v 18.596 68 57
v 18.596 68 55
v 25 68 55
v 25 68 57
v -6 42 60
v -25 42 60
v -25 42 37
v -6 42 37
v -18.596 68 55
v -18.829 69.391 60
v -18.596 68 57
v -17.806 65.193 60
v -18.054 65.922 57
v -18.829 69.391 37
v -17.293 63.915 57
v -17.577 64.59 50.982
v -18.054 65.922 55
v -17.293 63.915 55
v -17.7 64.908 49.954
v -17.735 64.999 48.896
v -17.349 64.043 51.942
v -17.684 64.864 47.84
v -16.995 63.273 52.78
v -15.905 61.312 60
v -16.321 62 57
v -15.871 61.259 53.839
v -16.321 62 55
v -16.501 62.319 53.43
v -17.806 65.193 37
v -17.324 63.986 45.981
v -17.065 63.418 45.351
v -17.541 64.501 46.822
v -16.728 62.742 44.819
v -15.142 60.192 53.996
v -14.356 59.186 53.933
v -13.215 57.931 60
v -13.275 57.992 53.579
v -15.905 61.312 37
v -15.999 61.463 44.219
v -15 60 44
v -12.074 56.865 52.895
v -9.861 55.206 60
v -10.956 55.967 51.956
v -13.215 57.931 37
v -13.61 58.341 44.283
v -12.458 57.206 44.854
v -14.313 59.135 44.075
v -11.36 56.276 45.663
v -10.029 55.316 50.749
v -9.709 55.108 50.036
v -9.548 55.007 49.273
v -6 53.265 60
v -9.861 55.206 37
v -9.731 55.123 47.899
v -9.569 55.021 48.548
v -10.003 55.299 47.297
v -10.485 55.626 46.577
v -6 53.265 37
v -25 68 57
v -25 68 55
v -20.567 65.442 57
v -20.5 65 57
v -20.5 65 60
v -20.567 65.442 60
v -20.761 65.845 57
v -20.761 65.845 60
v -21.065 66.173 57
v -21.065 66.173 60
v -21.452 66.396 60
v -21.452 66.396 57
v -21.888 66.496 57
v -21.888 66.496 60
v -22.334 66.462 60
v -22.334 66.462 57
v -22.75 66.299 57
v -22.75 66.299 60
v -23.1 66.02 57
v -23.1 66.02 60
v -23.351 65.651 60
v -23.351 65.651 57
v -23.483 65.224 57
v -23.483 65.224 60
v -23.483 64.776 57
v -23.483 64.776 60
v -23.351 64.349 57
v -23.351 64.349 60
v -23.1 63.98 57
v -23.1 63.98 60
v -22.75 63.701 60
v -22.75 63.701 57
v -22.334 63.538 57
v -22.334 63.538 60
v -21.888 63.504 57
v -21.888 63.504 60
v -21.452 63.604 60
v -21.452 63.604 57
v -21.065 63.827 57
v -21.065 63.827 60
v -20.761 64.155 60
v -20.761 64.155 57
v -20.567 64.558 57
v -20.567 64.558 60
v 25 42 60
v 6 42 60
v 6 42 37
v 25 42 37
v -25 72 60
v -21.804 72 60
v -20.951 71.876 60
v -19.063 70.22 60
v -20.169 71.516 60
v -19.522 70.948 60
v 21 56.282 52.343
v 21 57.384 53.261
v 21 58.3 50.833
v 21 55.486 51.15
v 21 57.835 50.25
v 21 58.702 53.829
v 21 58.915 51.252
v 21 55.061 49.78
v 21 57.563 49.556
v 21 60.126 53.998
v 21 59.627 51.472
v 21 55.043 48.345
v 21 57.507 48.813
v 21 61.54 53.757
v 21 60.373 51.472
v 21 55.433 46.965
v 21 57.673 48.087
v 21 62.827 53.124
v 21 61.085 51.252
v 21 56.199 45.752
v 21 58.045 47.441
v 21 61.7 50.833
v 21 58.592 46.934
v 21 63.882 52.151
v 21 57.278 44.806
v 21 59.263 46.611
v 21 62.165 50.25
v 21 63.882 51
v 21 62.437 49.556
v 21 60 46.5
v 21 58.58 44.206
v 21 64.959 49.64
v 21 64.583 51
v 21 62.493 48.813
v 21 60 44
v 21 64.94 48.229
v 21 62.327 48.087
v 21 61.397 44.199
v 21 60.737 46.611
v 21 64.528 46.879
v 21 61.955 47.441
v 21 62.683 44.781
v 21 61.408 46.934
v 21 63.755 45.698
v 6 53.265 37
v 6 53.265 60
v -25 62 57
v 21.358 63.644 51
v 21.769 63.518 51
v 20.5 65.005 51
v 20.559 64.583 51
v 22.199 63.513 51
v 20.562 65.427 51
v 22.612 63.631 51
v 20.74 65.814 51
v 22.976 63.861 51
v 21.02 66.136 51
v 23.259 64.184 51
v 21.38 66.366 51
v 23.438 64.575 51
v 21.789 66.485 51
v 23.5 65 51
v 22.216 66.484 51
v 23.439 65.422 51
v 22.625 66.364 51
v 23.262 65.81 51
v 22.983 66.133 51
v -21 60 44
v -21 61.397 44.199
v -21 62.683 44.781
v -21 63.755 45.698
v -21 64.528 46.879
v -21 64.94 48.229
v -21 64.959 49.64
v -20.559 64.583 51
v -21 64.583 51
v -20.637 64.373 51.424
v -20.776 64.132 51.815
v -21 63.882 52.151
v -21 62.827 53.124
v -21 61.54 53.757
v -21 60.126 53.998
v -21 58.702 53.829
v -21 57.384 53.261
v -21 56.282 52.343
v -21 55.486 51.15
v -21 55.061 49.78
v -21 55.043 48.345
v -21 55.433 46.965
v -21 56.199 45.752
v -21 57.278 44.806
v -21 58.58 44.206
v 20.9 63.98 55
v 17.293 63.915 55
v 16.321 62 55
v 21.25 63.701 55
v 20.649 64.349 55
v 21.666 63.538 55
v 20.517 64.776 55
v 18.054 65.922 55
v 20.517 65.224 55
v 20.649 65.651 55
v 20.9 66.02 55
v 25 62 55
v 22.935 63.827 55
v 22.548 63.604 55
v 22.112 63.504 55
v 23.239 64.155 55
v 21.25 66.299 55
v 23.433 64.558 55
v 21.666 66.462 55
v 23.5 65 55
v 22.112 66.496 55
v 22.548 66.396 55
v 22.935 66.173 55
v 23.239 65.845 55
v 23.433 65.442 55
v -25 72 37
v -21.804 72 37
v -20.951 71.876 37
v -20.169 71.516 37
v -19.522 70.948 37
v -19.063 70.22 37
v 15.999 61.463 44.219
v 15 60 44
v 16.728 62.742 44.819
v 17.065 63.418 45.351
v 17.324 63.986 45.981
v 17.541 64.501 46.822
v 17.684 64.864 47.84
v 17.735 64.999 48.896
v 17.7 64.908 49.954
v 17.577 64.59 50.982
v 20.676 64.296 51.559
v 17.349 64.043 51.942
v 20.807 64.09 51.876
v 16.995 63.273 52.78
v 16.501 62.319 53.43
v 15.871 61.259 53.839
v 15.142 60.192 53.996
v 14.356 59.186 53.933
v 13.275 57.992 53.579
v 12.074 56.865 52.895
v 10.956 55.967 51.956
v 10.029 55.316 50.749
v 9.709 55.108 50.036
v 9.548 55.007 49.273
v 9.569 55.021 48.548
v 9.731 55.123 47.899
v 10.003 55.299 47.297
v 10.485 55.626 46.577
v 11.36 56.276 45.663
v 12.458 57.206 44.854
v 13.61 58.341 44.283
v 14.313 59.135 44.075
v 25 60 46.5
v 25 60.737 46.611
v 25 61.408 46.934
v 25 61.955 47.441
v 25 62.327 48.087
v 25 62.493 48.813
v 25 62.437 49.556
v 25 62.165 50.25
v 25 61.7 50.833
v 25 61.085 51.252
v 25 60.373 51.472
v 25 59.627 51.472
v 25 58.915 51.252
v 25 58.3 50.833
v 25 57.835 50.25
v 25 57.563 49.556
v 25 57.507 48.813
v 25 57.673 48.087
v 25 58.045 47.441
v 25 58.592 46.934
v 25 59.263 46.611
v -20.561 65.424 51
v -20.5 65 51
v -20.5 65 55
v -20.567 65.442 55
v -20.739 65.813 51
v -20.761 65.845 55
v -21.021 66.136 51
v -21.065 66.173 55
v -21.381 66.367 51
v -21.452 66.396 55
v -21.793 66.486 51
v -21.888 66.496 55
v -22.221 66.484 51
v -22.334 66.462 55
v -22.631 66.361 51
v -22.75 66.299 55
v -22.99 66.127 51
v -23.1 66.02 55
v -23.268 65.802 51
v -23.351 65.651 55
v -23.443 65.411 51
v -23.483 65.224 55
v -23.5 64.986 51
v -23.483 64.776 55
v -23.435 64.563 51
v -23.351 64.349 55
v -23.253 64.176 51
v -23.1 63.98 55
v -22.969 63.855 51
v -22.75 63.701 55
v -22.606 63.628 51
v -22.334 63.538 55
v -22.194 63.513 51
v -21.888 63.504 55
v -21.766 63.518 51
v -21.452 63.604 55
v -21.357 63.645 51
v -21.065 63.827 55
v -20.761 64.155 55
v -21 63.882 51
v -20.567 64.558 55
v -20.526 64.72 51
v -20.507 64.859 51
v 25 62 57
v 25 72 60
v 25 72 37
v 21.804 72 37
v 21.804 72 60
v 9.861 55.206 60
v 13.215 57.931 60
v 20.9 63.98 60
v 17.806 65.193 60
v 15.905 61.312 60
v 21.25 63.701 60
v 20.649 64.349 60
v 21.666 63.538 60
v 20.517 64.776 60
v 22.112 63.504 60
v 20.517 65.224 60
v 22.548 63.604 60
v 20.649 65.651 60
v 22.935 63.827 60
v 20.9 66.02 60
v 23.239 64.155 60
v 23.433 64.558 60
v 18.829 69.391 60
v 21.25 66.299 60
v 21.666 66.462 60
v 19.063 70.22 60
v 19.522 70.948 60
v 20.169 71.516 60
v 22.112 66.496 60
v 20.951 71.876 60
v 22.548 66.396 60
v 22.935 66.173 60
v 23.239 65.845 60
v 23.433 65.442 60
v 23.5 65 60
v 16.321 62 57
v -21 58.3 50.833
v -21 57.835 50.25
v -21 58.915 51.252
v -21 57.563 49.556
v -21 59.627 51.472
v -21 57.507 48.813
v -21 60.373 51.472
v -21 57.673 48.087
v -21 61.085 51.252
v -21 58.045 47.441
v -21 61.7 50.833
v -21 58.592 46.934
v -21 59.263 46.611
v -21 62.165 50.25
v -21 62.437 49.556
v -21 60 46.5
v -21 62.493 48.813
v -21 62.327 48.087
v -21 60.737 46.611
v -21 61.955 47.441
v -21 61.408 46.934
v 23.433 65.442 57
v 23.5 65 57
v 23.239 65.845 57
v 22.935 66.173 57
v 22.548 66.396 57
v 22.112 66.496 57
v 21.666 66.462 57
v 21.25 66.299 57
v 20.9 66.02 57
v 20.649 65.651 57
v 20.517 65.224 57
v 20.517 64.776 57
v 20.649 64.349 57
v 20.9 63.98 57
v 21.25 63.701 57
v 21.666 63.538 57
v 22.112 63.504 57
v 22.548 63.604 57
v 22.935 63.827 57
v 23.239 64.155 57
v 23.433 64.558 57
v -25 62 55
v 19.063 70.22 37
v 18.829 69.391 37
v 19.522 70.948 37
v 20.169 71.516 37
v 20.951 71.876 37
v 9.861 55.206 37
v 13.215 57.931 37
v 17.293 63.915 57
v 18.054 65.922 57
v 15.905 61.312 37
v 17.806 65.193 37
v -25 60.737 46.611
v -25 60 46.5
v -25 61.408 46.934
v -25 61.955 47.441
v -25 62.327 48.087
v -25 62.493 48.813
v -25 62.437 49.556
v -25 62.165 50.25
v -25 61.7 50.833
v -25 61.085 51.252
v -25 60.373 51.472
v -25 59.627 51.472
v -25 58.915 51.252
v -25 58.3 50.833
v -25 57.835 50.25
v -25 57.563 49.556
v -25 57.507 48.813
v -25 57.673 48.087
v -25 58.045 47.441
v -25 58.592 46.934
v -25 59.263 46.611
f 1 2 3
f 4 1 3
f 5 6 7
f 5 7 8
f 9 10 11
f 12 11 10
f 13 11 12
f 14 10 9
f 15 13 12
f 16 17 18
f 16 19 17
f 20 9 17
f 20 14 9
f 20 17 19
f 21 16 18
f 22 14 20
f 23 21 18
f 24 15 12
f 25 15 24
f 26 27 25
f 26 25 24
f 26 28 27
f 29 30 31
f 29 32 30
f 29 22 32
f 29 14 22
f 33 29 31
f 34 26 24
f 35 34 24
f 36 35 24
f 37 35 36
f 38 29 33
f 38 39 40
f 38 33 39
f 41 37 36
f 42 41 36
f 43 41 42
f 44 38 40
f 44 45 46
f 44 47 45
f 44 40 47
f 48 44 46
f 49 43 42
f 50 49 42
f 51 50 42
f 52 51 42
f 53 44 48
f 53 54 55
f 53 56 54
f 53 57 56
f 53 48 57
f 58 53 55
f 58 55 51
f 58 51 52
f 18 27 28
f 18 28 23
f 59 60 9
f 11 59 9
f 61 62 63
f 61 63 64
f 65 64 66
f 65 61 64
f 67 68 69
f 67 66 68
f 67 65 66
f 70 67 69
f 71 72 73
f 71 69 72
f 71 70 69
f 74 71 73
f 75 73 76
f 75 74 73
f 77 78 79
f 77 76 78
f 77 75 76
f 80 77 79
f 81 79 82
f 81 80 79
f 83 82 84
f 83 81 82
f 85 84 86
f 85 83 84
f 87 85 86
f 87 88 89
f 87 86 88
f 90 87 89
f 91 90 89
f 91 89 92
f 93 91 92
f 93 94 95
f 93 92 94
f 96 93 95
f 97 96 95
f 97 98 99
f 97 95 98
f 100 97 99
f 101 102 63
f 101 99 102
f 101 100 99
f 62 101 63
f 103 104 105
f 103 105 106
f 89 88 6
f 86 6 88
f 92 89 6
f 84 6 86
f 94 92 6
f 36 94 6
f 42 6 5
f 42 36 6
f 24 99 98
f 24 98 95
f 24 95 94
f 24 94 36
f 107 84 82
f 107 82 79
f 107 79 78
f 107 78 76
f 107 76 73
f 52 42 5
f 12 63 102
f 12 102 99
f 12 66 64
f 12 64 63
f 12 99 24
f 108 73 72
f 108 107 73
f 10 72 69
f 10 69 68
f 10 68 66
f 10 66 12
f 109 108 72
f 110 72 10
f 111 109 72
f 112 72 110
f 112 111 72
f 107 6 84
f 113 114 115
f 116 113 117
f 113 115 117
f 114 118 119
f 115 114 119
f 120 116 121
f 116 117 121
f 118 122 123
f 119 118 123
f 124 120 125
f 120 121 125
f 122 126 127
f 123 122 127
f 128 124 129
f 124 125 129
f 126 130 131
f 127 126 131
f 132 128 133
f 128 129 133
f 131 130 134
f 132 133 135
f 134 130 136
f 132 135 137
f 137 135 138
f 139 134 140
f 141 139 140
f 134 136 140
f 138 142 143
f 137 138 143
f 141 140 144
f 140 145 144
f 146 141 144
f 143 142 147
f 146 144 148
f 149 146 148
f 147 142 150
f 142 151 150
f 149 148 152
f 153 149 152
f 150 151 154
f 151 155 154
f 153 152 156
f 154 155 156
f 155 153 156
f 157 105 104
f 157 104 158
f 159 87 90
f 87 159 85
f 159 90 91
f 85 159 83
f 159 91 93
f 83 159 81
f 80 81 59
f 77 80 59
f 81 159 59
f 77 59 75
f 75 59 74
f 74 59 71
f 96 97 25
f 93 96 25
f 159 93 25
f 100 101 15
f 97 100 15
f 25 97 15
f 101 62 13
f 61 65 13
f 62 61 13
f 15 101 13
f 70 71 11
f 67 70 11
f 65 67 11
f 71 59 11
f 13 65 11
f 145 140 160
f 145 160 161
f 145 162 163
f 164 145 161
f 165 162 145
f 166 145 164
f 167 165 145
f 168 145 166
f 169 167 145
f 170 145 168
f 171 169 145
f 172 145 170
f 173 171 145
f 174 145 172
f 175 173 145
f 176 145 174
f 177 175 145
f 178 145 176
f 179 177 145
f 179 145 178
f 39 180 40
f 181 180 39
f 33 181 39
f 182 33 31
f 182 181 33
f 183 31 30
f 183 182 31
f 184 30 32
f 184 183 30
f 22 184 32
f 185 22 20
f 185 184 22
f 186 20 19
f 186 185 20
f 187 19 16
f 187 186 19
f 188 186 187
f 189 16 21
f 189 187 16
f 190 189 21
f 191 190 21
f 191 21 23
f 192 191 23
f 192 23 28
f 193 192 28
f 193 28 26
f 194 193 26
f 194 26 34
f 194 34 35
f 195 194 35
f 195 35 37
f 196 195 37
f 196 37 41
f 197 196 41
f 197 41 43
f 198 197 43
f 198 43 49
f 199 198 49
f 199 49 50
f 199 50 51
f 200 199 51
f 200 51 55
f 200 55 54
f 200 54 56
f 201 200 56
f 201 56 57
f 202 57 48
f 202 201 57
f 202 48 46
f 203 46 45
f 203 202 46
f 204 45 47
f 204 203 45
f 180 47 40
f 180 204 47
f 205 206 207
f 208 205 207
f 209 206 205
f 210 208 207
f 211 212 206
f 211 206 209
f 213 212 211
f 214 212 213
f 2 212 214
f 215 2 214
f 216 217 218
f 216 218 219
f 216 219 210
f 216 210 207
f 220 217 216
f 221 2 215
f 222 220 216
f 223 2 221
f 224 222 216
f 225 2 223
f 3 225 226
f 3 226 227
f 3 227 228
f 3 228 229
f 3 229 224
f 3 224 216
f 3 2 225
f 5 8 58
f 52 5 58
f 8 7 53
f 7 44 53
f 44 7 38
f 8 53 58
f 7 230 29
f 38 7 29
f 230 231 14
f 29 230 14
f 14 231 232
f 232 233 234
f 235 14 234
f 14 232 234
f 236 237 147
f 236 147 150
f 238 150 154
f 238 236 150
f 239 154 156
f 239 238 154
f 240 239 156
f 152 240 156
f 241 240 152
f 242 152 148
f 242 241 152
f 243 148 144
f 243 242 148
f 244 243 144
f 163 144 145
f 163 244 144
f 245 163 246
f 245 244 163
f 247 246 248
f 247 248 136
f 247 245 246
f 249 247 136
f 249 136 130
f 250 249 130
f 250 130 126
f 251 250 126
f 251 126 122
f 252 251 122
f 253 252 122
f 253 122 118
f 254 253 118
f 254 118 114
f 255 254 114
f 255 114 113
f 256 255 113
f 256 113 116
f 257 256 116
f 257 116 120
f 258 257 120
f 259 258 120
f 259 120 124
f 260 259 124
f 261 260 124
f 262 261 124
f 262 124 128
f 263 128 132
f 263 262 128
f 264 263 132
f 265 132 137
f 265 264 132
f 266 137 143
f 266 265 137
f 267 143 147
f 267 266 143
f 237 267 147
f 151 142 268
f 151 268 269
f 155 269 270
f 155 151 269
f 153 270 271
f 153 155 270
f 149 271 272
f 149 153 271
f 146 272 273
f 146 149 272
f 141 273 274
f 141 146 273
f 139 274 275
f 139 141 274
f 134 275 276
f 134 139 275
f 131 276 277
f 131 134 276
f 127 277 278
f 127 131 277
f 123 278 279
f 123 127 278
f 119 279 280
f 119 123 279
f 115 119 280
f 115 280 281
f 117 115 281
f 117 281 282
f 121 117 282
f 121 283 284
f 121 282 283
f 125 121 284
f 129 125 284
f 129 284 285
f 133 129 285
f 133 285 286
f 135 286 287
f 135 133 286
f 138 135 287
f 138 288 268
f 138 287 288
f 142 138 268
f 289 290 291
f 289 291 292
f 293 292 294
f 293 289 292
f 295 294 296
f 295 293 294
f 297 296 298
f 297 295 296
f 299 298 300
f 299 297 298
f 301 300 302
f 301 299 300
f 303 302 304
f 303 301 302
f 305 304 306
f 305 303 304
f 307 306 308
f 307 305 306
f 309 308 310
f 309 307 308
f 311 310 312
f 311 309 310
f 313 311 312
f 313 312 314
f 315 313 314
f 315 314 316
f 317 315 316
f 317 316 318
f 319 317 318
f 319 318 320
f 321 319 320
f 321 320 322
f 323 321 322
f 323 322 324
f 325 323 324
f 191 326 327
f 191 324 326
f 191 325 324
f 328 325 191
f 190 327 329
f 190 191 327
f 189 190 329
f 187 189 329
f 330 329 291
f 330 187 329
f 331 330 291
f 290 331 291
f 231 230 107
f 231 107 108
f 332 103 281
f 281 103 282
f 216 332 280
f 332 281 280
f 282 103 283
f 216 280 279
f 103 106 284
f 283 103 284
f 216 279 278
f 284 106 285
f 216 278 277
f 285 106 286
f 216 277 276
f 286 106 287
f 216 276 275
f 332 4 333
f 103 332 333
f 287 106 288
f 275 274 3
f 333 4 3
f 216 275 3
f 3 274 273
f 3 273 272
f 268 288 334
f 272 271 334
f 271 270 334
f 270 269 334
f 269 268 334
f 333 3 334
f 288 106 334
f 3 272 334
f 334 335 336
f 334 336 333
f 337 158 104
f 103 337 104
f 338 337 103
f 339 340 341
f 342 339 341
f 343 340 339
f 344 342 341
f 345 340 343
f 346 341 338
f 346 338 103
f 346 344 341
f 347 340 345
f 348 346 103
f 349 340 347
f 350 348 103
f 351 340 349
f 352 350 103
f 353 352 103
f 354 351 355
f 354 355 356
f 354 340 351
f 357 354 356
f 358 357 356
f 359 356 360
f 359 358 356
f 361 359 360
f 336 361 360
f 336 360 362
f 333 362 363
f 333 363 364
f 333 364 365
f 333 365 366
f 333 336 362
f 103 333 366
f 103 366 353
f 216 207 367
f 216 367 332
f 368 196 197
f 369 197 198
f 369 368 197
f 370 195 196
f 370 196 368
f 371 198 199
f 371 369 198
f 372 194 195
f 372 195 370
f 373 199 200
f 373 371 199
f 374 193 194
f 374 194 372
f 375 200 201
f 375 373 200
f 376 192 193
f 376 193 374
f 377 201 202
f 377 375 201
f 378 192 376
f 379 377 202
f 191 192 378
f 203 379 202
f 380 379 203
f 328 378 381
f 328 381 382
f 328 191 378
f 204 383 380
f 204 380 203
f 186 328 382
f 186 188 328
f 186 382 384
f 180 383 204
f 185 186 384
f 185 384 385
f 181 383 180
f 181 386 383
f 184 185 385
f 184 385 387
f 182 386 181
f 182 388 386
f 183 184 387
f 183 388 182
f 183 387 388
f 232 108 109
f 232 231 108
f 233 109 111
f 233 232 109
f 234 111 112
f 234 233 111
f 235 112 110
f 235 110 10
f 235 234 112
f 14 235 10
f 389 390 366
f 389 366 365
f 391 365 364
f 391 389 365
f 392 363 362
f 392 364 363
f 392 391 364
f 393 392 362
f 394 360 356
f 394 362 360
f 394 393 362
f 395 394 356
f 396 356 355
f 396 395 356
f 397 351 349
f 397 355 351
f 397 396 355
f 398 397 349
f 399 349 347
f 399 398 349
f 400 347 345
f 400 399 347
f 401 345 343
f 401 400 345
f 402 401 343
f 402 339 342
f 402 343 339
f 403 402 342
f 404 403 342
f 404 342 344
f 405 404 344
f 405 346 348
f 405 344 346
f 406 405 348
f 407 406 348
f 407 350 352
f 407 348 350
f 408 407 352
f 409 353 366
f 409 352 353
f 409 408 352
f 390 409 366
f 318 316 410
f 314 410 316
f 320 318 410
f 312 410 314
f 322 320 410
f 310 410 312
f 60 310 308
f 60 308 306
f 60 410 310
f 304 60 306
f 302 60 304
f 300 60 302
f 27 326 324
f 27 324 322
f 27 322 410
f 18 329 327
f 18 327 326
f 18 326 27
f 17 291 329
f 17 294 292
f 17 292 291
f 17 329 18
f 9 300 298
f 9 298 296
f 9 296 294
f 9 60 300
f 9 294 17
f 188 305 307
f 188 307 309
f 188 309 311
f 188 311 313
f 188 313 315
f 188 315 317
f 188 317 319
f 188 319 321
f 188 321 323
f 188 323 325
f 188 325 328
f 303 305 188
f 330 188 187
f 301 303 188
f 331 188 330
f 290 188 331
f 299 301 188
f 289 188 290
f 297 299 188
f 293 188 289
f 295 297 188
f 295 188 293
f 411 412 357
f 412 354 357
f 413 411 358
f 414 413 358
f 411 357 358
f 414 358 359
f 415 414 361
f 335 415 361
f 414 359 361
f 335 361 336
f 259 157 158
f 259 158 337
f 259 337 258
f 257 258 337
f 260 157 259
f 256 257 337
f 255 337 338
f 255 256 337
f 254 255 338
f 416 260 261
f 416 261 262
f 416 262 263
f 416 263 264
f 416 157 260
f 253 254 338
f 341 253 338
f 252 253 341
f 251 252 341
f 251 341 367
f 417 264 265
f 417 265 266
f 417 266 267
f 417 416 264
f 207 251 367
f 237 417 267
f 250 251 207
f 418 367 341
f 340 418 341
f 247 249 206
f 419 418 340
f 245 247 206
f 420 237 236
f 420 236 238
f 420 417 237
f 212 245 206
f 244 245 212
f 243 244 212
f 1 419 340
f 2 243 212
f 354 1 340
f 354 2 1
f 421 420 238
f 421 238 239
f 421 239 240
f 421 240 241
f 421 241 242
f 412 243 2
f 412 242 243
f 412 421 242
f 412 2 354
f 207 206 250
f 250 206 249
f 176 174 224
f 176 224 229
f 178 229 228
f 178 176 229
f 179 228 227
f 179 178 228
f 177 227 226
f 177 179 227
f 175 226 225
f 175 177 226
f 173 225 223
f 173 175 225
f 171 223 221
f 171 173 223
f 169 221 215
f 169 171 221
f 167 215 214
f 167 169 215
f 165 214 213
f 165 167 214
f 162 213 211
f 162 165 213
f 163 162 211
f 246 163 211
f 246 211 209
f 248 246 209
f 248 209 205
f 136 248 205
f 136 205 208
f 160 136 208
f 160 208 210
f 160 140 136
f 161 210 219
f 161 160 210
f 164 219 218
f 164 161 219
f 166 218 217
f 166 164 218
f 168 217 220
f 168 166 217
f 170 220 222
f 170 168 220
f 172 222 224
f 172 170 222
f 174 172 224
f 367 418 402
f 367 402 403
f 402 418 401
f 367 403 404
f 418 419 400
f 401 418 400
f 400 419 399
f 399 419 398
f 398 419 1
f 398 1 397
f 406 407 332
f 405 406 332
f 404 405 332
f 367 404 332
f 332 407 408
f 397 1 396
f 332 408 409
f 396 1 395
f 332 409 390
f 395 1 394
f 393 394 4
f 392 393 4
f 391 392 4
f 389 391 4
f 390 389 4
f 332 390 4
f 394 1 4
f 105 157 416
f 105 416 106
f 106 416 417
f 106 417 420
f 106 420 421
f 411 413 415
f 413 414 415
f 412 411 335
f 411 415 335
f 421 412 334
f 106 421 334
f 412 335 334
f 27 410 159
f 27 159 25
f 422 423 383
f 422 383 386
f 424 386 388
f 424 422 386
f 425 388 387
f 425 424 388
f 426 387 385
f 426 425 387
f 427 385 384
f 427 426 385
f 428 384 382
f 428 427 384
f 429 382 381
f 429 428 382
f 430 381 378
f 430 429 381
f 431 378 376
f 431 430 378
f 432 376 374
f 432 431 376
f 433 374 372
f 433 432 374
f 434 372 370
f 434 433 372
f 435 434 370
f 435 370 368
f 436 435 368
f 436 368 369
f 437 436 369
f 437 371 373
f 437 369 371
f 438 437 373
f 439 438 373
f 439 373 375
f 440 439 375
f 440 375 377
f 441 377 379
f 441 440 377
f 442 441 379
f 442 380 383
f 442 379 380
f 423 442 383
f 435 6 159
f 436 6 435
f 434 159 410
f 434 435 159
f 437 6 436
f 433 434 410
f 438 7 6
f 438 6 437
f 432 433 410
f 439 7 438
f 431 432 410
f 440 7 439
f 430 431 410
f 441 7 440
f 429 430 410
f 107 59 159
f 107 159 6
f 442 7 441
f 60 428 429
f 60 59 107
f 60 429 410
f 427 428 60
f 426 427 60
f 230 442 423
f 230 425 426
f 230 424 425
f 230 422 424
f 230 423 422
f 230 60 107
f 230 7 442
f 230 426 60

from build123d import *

# Parameters (mm, degrees)
CYLINDER931_R     = 1.5
CYLINDER931_DEPTH = 30
CYLINDER930_R     = 1.5
CYLINDER930_DEPTH = 30
BOX437_W          = 16
BOX437_H          = 6
BOX437_DEPTH      = 2
BOX440_W          = 16
BOX440_H          = 6
BOX440_DEPTH      = 2
CYLINDER923_R     = 5
CYLINDER923_DEPTH = 20
CYLINDER926_R     = 5
CYLINDER926_DEPTH = 20
CYLINDER927_R     = 2.5
CYLINDER927_DEPTH = 2
CYLINDER929_R     = 2.5
CYLINDER929_DEPTH = 2
CYLINDER924_R     = 2.5
CYLINDER924_DEPTH = 150
CYLINDER925_R     = 20
CYLINDER925_DEPTH = 23
BOX438_W          = 19
BOX438_H          = 30
BOX438_DEPTH      = 23
CYLINDER928_R     = 20
CYLINDER928_DEPTH = 23
BOX439_W          = 19
BOX439_H          = 30
BOX439_DEPTH      = 23
FILLET045_R       = 3


with BuildPart() as v_lec931:
    # Cylinder931 → Cylinder931 (new body)
    with BuildSketch(Plane(origin=(22, 65, 51), x_dir=(1, 0, 0), z_dir=(0, 0, 1))):
        Circle(CYLINDER931_R)
    extrude(amount=CYLINDER931_DEPTH)


with BuildPart() as compound802:
    # Cylinder930 → Cylinder930 (new body)
    with BuildSketch(Plane(origin=(-22, 65, 51), x_dir=(1, 0, 0), z_dir=(0, 0, 1))):
        Circle(CYLINDER930_R)
    extrude(amount=CYLINDER930_DEPTH)

    # Compound802: union Válec931
    add(v_lec931.part)


with BuildPart() as krychle437:
    # Box437 → Box437 (new body)
    with BuildSketch(Plane(origin=(16, 62, 55), x_dir=(1, 0, 0), z_dir=(0, 0, 1))):
        with Locations((8, 3)):
            Rectangle(BOX437_W, BOX437_H)
    extrude(amount=BOX437_DEPTH)


with BuildPart() as compound798:
    # Box440 → Box440 (new body)
    with BuildSketch(Plane(origin=(-31, 62, 55), x_dir=(1, 0, 0), z_dir=(0, 0, 1))):
        with Locations((8, 3)):
            Rectangle(BOX440_W, BOX440_H)
    extrude(amount=BOX440_DEPTH)

    # Compound798: union Krychle437
    add(krychle437.part)


with BuildPart() as v_lec923:
    # Cylinder923 → Cylinder923 (new body)
    with BuildSketch(Plane(origin=(1, 56, 49), x_dir=(0, 0, -1), z_dir=(1, 0, 0))):
        Circle(CYLINDER923_R)
    extrude(amount=CYLINDER923_DEPTH)


with BuildPart() as compound800:
    # Cylinder926 → Cylinder926 (new body)
    with BuildSketch(Plane(origin=(-21, 56, 49), x_dir=(0, 0, -1), z_dir=(1, 0, 0))):
        Circle(CYLINDER926_R)
    extrude(amount=CYLINDER926_DEPTH)

    # Compound800: union Válec923
    add(v_lec923.part)


with BuildPart() as compound800_1:
    # Compound800 placement: moved
    add(compound800.part.moved(Location((0, 4, 0))))


with BuildPart() as v_lec927:
    # Cylinder927 → Cylinder927 (new body)
    with BuildSketch(Plane(origin=(-80, 38, 18), x_dir=(0, 0, -1), z_dir=(1, 0, 0))):
        Circle(CYLINDER927_R)
    extrude(amount=CYLINDER927_DEPTH)


with BuildPart() as v_lec929:
    # Cylinder929 → Cylinder929 (new body)
    with BuildSketch(Plane(origin=(80, 38, 18), x_dir=(0, 0, -1), z_dir=(1, 0, 0))):
        Circle(CYLINDER929_R)
    extrude(amount=CYLINDER929_DEPTH)


with BuildPart() as compound799:
    # Cylinder924 → Cylinder924 (new body)
    with BuildSketch(Plane(origin=(-57, 56, 18), x_dir=(0, 0, -1), z_dir=(1, 0, 0))):
        Circle(CYLINDER924_R)
    extrude(amount=CYLINDER924_DEPTH)

    # Compound799: union Válec927, Válec929
    add(v_lec927.part)
    add(v_lec929.part)


with BuildPart() as compound799_1:
    # Compound799 placement: moved
    add(compound799.part.moved(Location((-1, 4, 31))))


with BuildPart() as v_lec925:
    # Cylinder925 → Cylinder925 (new body)
    with BuildSketch(Plane(origin=(1, 72, 37), x_dir=(1, 0, 0), z_dir=(0, 0, 1))):
        Circle(CYLINDER925_R)
    extrude(amount=CYLINDER925_DEPTH)


with BuildPart() as cut390:
    # Box438 → Box438 (new body)
    with BuildSketch(Plane(origin=(-25, 42, 37), x_dir=(1, 0, 0), z_dir=(0, 0, 1))):
        with Locations((9.5, 15)):
            Rectangle(BOX438_W, BOX438_H)
    extrude(amount=BOX438_DEPTH)

    # Cut390: cut Válec925
    add(v_lec925.part, mode=Mode.SUBTRACT)


with BuildPart() as v_lec928:
    # Cylinder928 → Cylinder928 (new body)
    with BuildSketch(Plane(origin=(-1, 72, 37), x_dir=(1, 0, 0), z_dir=(0, 0, 1))):
        Circle(CYLINDER928_R)
    extrude(amount=CYLINDER928_DEPTH)


with BuildPart() as fillet045:
    # Box439 → Box439 (new body)
    with BuildSketch(Plane(origin=(6, 42, 37), x_dir=(1, 0, 0), z_dir=(0, 0, 1))):
        with Locations((9.5, 15)):
            Rectangle(BOX439_W, BOX439_H)
    extrude(amount=BOX439_DEPTH)

    # Cut391: cut Válec928
    add(v_lec928.part, mode=Mode.SUBTRACT)

    # Compound801: union Cut390
    add(cut390.part)

    # Cut389: cut Compound799
    add(compound799_1.part, mode=Mode.SUBTRACT)

    # Cut392: cut Compound800
    add(compound800_1.part, mode=Mode.SUBTRACT)

    # Cut388: cut Compound798
    add(compound798.part, mode=Mode.SUBTRACT)

    # Cut394: cut Compound802
    add(compound802.part, mode=Mode.SUBTRACT)

    # Fillet045
    fillet045_edges = [fillet045.edges().sort_by_distance(p)[0] for p in [
        (19, 72, 48.5),
        (-19, 72, 48.5),
    ]]
    fillet(fillet045_edges, radius=FILLET045_R)


solid = fillet045.part
